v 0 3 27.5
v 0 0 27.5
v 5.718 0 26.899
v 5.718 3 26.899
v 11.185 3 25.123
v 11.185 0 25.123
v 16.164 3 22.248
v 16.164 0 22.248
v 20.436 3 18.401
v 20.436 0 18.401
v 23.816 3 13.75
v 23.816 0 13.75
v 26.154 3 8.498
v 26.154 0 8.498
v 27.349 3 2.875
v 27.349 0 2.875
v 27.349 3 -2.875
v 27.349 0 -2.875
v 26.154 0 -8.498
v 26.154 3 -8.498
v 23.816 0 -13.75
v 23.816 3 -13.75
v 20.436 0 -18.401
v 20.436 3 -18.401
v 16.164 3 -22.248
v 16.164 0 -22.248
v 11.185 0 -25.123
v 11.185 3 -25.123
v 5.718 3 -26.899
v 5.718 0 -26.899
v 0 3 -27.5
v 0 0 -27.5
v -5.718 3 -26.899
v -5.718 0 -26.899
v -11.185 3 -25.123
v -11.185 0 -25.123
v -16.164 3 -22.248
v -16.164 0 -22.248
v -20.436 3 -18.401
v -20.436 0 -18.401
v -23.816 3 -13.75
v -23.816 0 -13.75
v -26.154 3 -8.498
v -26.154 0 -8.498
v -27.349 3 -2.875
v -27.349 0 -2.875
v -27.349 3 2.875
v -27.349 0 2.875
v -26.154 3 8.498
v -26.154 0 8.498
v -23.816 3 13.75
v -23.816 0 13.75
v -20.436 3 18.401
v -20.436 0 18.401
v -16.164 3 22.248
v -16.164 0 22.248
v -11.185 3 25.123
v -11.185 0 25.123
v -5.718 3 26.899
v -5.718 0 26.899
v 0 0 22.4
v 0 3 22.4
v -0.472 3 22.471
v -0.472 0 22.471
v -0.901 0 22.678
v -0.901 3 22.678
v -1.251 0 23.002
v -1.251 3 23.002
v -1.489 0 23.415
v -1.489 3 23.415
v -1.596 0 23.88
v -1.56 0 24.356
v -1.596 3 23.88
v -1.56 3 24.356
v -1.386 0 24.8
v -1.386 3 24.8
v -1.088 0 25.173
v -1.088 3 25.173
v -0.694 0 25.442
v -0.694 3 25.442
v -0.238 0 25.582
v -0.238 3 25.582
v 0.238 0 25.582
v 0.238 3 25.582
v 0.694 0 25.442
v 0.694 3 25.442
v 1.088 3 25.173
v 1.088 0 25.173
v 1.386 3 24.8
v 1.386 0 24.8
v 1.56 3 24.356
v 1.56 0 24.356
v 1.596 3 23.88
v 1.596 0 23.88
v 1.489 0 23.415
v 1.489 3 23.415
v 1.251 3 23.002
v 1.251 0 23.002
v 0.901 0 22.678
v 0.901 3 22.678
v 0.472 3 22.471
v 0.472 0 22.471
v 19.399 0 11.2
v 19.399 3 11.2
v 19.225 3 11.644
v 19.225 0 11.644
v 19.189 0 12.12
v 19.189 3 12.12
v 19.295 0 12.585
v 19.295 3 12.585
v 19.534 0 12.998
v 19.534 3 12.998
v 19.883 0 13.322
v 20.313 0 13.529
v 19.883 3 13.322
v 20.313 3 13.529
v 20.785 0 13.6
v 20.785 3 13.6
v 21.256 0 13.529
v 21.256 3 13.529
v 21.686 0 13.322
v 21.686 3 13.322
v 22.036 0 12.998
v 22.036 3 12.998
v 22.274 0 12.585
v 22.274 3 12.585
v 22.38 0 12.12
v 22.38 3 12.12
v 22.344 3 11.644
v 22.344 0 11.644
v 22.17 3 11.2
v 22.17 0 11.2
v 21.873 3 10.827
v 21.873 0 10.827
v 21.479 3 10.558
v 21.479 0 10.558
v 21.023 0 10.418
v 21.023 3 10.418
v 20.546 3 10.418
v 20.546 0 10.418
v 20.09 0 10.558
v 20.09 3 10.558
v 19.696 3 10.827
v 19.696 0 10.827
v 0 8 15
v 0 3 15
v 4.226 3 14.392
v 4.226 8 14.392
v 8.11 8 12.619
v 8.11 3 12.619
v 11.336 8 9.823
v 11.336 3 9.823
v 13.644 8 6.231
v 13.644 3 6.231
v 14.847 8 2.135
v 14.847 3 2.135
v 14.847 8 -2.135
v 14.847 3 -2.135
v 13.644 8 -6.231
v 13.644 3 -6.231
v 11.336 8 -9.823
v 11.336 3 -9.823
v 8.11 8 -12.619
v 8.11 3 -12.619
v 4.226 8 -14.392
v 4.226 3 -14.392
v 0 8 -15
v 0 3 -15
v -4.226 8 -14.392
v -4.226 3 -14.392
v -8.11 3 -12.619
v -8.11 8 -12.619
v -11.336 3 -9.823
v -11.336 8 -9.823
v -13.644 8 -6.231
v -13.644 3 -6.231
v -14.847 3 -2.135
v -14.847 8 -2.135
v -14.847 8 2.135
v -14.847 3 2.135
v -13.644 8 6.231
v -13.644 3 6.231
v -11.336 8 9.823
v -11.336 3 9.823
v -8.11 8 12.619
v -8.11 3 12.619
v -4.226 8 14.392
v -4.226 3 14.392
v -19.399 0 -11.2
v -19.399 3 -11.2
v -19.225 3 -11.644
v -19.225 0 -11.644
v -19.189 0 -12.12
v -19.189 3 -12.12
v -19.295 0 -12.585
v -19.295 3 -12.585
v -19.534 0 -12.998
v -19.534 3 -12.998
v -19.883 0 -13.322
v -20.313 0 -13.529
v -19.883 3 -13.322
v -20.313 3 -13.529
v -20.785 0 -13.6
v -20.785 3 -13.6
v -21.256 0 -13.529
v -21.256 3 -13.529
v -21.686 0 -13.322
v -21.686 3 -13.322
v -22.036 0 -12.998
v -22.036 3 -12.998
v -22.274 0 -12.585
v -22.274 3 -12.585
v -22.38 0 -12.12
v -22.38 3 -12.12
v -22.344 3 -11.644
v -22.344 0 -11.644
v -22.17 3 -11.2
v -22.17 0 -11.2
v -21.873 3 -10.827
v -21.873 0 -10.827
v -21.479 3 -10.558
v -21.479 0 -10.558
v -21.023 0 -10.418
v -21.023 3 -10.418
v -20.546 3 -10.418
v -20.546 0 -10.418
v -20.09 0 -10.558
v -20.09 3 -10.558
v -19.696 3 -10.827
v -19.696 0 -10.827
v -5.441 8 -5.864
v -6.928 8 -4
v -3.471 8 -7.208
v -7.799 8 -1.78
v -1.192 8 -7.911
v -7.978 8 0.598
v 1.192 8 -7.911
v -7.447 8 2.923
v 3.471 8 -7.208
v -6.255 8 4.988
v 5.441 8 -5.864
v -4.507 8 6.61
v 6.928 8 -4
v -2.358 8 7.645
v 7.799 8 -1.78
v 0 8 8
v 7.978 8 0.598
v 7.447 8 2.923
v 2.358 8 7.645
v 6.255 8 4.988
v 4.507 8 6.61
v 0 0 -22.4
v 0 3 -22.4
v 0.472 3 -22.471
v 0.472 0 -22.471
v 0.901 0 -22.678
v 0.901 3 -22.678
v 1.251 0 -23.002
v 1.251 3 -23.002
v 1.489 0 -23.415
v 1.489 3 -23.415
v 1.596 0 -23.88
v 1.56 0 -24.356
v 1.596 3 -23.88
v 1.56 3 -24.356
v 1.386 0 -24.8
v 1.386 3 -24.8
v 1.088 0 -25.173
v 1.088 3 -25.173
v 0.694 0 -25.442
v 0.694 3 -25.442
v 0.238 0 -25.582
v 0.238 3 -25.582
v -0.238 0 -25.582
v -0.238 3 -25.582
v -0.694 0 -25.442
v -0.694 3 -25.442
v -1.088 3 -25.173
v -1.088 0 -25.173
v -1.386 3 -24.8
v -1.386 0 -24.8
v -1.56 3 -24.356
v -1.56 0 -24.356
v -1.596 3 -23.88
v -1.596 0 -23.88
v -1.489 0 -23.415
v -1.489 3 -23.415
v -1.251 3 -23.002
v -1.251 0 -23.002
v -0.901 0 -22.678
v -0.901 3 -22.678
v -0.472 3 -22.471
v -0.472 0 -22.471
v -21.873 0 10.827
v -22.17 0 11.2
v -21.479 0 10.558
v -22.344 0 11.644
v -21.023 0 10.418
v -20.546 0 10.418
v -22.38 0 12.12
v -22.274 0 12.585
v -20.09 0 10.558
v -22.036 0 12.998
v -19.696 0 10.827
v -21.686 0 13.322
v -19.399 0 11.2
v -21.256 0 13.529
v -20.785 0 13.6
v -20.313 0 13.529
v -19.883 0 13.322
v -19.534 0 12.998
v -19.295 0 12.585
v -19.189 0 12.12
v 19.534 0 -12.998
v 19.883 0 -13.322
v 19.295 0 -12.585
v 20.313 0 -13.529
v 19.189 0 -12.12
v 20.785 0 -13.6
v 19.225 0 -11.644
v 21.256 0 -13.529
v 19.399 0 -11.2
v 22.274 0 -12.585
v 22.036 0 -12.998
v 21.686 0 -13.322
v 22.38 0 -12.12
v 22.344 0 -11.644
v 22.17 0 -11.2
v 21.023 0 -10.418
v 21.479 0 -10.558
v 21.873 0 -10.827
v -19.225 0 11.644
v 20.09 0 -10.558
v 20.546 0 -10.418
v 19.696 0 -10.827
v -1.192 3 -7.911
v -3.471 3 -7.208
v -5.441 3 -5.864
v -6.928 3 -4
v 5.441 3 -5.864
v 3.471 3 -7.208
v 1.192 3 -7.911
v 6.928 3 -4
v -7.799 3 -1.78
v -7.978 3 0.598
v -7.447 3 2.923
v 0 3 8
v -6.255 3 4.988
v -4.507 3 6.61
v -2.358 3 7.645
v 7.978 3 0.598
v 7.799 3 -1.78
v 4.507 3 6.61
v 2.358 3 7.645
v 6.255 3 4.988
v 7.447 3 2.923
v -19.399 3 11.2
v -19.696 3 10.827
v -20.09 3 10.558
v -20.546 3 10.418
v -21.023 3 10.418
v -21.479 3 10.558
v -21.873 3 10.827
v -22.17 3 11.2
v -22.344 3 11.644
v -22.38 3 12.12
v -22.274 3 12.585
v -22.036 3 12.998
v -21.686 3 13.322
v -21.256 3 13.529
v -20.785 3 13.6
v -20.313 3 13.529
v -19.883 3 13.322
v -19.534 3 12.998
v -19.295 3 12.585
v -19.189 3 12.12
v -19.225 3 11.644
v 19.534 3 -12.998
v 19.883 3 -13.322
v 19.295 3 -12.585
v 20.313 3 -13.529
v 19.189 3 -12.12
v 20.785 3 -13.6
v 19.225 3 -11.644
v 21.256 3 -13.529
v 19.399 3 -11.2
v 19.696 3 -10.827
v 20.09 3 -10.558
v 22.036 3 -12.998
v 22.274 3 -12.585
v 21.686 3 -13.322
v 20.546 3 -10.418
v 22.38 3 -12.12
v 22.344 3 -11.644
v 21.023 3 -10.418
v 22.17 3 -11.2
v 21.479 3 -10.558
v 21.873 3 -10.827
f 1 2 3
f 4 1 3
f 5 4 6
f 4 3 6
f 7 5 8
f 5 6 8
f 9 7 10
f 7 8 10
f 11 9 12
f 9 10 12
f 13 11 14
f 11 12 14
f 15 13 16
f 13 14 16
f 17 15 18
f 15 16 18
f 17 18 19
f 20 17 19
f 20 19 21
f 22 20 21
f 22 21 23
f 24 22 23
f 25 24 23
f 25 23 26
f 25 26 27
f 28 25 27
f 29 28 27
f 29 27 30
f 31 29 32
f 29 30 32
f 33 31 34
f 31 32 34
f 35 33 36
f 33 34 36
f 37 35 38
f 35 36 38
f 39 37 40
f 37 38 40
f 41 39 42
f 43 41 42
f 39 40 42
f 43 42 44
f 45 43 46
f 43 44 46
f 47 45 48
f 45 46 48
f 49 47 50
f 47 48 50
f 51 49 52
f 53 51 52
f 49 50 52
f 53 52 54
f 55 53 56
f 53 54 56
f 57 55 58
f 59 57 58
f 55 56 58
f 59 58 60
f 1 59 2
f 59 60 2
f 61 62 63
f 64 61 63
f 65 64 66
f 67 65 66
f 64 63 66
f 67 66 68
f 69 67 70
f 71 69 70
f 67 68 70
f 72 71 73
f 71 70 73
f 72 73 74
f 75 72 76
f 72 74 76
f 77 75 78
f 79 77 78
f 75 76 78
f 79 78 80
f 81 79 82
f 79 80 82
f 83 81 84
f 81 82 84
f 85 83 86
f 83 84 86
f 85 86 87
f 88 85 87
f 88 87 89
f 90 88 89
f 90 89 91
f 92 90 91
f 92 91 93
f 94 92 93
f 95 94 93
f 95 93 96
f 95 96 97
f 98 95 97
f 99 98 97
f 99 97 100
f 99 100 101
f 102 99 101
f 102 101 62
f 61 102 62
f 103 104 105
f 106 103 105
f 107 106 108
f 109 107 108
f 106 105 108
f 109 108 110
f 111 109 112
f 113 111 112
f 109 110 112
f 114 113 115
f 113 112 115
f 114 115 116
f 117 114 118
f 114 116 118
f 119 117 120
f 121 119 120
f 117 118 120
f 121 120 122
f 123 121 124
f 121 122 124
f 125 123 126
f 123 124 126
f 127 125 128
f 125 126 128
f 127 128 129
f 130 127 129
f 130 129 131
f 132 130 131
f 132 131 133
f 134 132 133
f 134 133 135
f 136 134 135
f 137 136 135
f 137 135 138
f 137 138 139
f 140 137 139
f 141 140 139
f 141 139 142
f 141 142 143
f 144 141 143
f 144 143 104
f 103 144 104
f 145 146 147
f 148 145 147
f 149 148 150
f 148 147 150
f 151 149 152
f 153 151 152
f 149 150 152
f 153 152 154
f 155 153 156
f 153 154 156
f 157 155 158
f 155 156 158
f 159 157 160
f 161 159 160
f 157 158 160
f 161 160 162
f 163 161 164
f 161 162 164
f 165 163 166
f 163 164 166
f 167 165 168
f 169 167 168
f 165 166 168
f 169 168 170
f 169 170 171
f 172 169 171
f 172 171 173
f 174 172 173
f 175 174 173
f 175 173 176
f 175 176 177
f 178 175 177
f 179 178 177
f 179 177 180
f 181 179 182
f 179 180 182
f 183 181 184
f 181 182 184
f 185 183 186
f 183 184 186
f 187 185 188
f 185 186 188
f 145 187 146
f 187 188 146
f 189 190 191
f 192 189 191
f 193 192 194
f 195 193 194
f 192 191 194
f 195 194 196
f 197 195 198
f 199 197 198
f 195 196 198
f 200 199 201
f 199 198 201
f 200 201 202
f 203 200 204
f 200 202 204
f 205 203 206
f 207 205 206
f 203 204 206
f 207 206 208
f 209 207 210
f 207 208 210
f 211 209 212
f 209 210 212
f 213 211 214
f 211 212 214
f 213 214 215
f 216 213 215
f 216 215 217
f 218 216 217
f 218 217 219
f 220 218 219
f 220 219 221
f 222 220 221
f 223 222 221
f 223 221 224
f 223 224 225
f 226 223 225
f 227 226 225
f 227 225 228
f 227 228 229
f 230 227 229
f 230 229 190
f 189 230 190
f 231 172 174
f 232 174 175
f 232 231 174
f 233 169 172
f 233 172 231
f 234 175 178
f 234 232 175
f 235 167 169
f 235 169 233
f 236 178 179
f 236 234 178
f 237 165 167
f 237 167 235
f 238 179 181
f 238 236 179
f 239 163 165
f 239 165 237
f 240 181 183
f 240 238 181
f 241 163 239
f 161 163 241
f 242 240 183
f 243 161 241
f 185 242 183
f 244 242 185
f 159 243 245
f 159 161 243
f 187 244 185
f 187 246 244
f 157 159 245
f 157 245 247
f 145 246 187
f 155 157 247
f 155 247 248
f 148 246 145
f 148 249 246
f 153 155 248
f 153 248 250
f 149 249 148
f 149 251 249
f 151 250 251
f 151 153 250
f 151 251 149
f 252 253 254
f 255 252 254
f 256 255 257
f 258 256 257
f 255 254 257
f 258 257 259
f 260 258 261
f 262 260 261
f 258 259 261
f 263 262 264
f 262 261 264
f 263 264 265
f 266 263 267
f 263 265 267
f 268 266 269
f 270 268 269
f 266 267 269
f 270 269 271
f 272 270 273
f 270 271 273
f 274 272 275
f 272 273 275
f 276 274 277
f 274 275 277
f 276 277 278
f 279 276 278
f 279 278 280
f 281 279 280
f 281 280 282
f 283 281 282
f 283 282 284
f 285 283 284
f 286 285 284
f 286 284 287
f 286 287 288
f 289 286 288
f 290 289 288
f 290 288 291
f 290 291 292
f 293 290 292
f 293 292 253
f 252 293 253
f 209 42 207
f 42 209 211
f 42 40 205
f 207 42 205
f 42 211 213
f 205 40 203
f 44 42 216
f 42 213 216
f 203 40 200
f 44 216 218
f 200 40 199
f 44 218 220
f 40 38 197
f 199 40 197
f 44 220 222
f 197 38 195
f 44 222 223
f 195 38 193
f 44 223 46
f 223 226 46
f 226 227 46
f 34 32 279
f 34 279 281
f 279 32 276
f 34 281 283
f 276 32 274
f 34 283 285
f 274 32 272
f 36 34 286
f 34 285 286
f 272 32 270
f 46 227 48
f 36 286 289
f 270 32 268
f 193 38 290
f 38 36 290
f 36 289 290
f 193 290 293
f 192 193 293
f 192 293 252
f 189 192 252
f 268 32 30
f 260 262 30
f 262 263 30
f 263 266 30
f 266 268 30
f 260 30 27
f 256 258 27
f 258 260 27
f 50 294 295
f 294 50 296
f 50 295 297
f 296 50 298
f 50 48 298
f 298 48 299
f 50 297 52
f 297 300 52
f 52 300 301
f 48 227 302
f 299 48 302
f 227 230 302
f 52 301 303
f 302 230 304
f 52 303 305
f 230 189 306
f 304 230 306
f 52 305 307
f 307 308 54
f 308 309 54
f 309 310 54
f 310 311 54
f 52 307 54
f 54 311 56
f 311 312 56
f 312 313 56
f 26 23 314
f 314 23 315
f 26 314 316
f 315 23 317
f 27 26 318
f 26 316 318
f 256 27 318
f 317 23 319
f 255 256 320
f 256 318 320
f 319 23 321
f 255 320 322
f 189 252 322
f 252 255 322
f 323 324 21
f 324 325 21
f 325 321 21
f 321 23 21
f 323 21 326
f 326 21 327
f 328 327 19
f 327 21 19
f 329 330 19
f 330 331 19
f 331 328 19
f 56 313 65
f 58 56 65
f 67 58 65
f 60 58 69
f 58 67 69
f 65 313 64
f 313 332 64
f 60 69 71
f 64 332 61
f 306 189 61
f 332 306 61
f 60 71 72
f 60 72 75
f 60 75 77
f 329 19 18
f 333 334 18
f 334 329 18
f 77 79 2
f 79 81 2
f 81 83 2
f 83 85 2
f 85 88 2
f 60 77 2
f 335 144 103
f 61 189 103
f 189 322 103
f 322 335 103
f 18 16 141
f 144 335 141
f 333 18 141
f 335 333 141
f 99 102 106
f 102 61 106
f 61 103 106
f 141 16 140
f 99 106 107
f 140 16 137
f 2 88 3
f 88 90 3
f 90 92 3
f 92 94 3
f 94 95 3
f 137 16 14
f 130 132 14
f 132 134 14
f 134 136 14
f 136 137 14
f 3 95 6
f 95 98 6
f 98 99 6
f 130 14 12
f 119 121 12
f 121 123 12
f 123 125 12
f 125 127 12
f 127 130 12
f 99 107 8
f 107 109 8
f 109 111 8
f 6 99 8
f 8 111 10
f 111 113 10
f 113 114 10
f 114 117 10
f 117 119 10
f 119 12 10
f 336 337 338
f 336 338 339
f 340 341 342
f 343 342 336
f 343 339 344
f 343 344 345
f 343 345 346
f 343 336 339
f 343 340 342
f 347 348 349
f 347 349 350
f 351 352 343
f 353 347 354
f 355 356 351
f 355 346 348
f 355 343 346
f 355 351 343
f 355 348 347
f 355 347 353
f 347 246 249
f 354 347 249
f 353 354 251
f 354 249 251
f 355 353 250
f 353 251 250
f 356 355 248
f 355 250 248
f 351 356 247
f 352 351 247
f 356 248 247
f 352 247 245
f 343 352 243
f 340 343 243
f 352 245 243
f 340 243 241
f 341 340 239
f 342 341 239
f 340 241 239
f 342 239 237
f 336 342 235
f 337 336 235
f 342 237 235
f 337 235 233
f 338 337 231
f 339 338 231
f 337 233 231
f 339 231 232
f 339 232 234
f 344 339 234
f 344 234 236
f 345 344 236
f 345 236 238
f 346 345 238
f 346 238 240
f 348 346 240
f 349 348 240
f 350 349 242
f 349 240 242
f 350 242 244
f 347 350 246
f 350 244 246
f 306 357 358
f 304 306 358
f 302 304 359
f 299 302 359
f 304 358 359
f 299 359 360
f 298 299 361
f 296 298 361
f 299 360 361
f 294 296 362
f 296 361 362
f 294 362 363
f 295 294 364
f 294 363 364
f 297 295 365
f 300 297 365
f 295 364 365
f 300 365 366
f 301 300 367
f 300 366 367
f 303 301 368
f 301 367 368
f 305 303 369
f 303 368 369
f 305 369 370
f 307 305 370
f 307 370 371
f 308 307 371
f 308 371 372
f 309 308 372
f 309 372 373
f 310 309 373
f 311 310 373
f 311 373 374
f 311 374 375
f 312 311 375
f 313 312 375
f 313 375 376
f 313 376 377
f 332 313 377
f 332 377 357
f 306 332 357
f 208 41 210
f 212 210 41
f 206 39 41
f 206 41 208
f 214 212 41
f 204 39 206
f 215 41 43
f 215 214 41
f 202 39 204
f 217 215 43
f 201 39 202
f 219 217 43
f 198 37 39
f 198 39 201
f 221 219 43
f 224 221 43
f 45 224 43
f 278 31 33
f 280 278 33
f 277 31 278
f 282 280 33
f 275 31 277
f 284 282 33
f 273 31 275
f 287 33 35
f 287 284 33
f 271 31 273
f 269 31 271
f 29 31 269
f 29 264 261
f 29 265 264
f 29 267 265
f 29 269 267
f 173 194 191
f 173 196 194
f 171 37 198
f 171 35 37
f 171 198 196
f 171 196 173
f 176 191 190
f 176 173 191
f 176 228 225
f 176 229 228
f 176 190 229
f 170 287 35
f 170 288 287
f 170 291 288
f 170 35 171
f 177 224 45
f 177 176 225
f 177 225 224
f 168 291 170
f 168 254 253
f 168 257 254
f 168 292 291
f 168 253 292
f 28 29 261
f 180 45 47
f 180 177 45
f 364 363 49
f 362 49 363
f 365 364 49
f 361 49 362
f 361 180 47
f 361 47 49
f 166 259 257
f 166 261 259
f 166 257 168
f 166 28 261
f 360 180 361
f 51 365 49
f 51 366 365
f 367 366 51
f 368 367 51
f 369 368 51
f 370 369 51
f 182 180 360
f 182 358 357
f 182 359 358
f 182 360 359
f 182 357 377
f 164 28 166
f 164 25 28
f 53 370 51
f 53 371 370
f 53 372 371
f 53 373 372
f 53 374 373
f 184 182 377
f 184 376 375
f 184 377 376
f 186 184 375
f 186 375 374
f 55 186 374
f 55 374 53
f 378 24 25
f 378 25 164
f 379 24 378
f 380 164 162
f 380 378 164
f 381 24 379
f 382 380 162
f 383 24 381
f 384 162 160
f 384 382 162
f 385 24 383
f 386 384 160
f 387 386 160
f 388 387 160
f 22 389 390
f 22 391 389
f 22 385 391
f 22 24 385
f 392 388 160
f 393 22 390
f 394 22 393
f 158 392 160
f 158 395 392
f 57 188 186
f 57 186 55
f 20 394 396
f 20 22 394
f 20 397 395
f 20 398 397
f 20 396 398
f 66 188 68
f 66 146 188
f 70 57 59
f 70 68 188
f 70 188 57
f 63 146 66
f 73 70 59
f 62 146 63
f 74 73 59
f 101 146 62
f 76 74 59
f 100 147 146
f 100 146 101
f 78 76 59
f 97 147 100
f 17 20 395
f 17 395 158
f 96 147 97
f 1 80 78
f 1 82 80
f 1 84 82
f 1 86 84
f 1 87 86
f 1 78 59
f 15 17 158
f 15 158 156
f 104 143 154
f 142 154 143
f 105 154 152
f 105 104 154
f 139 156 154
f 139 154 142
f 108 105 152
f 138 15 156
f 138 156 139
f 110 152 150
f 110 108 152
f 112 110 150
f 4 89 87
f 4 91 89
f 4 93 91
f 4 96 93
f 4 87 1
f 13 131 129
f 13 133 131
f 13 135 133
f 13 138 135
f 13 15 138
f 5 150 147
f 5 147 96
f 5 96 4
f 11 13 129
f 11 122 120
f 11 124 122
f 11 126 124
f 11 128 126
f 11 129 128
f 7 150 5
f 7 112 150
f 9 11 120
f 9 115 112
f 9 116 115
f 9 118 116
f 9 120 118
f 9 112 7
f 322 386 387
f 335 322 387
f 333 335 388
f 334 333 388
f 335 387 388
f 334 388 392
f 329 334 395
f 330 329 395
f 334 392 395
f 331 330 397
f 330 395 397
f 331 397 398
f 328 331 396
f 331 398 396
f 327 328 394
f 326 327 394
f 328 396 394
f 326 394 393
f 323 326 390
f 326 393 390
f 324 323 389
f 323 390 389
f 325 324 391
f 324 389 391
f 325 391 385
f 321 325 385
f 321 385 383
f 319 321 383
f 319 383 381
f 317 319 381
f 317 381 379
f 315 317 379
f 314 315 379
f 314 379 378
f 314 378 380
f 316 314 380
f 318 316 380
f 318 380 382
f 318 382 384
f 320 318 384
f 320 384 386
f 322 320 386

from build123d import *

# Parameters (mm, degrees)
SKETCH_1_R               = 27.5
EXTRUDE_1_DEPTH          = 3
SKETCH_2_R               = 15
EXTRUDE_2_DEPTH          = 5
CUT_EXTRUDE_1_REACH      = 41.211
SKETCH_4_R               = 1.6
PATTERN_CIRCULAR_1_COUNT = 6
SKETCH_5_R               = 8
CUT_EXTRUDE_2_DEPTH      = 5


with BuildPart() as part:
    # 草图1 → 凸台-拉伸1 (new body)
    with BuildSketch(Plane(origin=(0, 0, 0), x_dir=(1, 0, 0), z_dir=(0, 1, 0))):
        with Locations(Location((0, 0, 0), (0, 0, 270))):
            Circle(SKETCH_1_R)
    extrude(amount=EXTRUDE_1_DEPTH)

    # 草图2 → 凸台-拉伸2 (add)
    with BuildSketch(Plane(origin=(0, 3, 0), x_dir=(1, 0, 0), z_dir=(0, 1, 0))):
        with Locations(Location((0, 0, 0), (0, 0, 270))):
            Circle(SKETCH_2_R)
    extrude(amount=EXTRUDE_2_DEPTH)

    # 草图4 → 切除-拉伸1 (cut, up to next)
    with BuildSketch(Plane(origin=(0, 3, 0), x_dir=(1, 0, 0), z_dir=(0, 1, 0)), mode=Mode.PRIVATE) as cut_extrude_1_sk1:
        with Locations(Location((0, 24, 0), (0, 0, 270))):
            Circle(SKETCH_4_R)
    cut_extrude_1_tool1 = extrude(cut_extrude_1_sk1.sketch, amount=-CUT_EXTRUDE_1_REACH, mode=Mode.PRIVATE) & part.part
    cut_extrude_1 = cut_extrude_1_tool1.solids().sort_by_distance((0, 3, -24))[0]
    add(cut_extrude_1, mode=Mode.SUBTRACT)

    # 阵列(圆周)1: 切除-拉伸1 ×6 about axis
    pattern_circular_1_axis = Axis((0, 0, 0), (0, 1, 0))
    for i in range(1, PATTERN_CIRCULAR_1_COUNT):
        add(cut_extrude_1.rotate(pattern_circular_1_axis, i * 360 / PATTERN_CIRCULAR_1_COUNT), mode=Mode.SUBTRACT)

    # 草图5 → 切除-拉伸2 (cut)
    with BuildSketch(Plane(origin=(0, 8, 0), x_dir=(1, 0, 0), z_dir=(0, 1, 0))):
        with Locations(Location((0, 0, 0), (0, 0, 270))):
            Circle(SKETCH_5_R)
    extrude(amount=-CUT_EXTRUDE_2_DEPTH, mode=Mode.SUBTRACT)


solid = part.part
